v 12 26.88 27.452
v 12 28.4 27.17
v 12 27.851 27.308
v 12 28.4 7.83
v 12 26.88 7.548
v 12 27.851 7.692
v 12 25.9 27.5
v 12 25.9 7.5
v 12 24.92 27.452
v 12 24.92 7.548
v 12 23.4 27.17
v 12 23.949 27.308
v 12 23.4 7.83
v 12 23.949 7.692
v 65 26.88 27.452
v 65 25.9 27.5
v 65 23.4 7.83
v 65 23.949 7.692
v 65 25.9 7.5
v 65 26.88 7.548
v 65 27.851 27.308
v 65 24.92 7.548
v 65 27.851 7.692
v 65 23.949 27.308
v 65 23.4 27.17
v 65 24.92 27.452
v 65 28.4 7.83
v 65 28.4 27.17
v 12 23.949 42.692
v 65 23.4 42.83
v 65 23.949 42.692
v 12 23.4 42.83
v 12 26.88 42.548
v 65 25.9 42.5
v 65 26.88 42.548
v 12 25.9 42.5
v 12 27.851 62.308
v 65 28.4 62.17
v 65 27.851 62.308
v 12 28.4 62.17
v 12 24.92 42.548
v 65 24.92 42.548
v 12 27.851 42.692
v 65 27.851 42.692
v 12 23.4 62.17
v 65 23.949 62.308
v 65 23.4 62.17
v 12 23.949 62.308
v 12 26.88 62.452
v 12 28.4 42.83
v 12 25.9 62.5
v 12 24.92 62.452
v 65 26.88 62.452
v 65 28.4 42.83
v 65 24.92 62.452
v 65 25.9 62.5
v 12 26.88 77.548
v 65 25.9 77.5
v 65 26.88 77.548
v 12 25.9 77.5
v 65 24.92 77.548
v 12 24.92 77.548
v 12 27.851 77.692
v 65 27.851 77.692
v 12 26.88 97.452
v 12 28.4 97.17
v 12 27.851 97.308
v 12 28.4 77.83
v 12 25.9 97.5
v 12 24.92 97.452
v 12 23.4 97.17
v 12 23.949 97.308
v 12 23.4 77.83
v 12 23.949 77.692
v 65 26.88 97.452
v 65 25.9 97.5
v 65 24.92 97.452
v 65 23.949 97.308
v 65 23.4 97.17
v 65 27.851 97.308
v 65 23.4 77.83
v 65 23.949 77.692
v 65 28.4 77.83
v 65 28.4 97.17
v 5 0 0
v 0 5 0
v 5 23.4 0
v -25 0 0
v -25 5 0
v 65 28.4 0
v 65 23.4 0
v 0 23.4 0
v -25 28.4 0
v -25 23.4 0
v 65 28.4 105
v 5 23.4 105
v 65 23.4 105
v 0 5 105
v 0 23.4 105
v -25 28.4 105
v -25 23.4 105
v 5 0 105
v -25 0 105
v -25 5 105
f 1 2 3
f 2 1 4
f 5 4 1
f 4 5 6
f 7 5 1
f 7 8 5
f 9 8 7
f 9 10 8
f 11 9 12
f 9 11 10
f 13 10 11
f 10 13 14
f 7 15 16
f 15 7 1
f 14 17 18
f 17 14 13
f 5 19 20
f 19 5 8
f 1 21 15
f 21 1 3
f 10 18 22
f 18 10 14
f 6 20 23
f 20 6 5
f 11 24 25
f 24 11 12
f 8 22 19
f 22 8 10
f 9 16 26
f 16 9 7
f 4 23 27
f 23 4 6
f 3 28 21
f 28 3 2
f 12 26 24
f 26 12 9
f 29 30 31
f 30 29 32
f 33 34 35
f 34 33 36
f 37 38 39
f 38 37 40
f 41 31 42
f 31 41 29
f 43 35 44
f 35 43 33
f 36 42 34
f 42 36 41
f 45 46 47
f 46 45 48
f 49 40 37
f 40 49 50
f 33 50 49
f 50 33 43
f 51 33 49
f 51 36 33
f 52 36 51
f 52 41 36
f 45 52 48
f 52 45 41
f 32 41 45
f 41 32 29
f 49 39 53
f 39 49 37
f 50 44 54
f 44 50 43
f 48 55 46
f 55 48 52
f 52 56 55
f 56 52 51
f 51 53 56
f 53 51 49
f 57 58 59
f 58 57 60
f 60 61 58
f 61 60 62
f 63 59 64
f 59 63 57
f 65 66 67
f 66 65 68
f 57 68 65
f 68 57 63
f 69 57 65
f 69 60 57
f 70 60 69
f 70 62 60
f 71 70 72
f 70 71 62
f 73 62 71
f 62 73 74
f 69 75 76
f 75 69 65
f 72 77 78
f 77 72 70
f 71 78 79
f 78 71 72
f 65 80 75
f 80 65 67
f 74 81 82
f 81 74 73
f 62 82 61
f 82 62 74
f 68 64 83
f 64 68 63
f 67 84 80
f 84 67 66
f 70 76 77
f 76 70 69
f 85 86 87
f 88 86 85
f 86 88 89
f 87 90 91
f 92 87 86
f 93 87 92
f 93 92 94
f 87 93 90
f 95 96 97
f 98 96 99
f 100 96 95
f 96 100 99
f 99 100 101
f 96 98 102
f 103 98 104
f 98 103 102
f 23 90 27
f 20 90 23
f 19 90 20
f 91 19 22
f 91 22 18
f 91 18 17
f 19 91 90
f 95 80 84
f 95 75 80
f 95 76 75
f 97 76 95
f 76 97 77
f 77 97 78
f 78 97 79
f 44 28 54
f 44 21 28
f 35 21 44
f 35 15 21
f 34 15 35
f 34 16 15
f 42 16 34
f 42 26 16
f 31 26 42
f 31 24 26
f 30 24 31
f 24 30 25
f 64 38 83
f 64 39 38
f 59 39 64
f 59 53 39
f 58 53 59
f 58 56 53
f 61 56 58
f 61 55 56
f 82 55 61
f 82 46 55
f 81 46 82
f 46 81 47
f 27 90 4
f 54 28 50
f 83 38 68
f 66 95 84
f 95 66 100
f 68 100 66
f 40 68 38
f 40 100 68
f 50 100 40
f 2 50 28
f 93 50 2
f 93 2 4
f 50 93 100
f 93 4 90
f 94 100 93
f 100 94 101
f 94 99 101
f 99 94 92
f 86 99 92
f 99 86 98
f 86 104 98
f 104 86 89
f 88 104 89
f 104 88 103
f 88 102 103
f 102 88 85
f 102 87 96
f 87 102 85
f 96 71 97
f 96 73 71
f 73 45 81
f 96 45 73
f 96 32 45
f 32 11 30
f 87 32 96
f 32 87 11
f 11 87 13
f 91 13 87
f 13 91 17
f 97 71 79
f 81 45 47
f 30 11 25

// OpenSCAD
// Pipette Holder Clamp
// Designed for an 18mm shelf.
// Printed lying on its side (XY plane is the profile, Z is the extrusion/length).

// --- Dimensions ---
shelf_thickness = 18.0;
spine_x_end     = 5.0;
spine_y_end     = 28.4;

bottom_jaw_x_start = -25.0;
bottom_jaw_x_end   = 5.0;
bottom_jaw_y_end    = 5.0;

top_jaw_x_start    = -25.0;
top_jaw_x_end      = 65.0;
top_jaw_y_start     = 23.4;
top_jaw_y_end       = 28.4;

extrusion_length    = 105.0;
hole_diameter       = 20.0;
hole_x_pos          = 42.0;
hole_z_pos_1        = 17.5;
hole_z_pos_2        = 52.5;
hole_z_pos_3        = 87.5;

$fn = 64;

// --- Geometry Construction ---

module profile() {
    union() {
        // Spine (back vertical part)
        square([spine_x_end, spine_y_end]);
        
        // Bottom Jaw
        translate([bottom_jaw_x_start, 0]) 
            square([bottom_jaw_x_end - bottom_jaw_x_start, bottom_jaw_y_end]);
        
        // Top Jaw and Arm
        translate([top_jaw_x_start, top_jaw_y_start]) 
            square([top_jaw_x_end - top_jaw_x_start, top_jaw_y_end - top_jaw_y_start]);
    }
}

difference() {
    // The main extruded body
    linear_extrude(height = extrusion_length) {
        profile();
    }

    // The three pipette holes
    // Holes are centered at x = 42 and specific Z positions.
    // They go through the arm along the Y axis.
    // We translate the cylinder so its center is at the arm's Y-midpoint.
    // We use a large height and translate it to ensure it cuts through the profile.
    for (z_pos = [hole_z_pos_1, hole_z_pos_2, hole_z_pos_3]) {
        // Arm Y-midpoint = (23.4 + 28.4) / 2 = 25.9
        // We translate to the center of the arm, and use a cylinder that 
        // extends far enough in Y to clear the entire part.
        translate([hole_x_pos, (top_jaw_y_start + top_jaw_y_end) / 2, z_pos])
        rotate([0, 90, 0]) 
        cylinder(h = 60, d = hole_diameter, center = true); 
    }
}
